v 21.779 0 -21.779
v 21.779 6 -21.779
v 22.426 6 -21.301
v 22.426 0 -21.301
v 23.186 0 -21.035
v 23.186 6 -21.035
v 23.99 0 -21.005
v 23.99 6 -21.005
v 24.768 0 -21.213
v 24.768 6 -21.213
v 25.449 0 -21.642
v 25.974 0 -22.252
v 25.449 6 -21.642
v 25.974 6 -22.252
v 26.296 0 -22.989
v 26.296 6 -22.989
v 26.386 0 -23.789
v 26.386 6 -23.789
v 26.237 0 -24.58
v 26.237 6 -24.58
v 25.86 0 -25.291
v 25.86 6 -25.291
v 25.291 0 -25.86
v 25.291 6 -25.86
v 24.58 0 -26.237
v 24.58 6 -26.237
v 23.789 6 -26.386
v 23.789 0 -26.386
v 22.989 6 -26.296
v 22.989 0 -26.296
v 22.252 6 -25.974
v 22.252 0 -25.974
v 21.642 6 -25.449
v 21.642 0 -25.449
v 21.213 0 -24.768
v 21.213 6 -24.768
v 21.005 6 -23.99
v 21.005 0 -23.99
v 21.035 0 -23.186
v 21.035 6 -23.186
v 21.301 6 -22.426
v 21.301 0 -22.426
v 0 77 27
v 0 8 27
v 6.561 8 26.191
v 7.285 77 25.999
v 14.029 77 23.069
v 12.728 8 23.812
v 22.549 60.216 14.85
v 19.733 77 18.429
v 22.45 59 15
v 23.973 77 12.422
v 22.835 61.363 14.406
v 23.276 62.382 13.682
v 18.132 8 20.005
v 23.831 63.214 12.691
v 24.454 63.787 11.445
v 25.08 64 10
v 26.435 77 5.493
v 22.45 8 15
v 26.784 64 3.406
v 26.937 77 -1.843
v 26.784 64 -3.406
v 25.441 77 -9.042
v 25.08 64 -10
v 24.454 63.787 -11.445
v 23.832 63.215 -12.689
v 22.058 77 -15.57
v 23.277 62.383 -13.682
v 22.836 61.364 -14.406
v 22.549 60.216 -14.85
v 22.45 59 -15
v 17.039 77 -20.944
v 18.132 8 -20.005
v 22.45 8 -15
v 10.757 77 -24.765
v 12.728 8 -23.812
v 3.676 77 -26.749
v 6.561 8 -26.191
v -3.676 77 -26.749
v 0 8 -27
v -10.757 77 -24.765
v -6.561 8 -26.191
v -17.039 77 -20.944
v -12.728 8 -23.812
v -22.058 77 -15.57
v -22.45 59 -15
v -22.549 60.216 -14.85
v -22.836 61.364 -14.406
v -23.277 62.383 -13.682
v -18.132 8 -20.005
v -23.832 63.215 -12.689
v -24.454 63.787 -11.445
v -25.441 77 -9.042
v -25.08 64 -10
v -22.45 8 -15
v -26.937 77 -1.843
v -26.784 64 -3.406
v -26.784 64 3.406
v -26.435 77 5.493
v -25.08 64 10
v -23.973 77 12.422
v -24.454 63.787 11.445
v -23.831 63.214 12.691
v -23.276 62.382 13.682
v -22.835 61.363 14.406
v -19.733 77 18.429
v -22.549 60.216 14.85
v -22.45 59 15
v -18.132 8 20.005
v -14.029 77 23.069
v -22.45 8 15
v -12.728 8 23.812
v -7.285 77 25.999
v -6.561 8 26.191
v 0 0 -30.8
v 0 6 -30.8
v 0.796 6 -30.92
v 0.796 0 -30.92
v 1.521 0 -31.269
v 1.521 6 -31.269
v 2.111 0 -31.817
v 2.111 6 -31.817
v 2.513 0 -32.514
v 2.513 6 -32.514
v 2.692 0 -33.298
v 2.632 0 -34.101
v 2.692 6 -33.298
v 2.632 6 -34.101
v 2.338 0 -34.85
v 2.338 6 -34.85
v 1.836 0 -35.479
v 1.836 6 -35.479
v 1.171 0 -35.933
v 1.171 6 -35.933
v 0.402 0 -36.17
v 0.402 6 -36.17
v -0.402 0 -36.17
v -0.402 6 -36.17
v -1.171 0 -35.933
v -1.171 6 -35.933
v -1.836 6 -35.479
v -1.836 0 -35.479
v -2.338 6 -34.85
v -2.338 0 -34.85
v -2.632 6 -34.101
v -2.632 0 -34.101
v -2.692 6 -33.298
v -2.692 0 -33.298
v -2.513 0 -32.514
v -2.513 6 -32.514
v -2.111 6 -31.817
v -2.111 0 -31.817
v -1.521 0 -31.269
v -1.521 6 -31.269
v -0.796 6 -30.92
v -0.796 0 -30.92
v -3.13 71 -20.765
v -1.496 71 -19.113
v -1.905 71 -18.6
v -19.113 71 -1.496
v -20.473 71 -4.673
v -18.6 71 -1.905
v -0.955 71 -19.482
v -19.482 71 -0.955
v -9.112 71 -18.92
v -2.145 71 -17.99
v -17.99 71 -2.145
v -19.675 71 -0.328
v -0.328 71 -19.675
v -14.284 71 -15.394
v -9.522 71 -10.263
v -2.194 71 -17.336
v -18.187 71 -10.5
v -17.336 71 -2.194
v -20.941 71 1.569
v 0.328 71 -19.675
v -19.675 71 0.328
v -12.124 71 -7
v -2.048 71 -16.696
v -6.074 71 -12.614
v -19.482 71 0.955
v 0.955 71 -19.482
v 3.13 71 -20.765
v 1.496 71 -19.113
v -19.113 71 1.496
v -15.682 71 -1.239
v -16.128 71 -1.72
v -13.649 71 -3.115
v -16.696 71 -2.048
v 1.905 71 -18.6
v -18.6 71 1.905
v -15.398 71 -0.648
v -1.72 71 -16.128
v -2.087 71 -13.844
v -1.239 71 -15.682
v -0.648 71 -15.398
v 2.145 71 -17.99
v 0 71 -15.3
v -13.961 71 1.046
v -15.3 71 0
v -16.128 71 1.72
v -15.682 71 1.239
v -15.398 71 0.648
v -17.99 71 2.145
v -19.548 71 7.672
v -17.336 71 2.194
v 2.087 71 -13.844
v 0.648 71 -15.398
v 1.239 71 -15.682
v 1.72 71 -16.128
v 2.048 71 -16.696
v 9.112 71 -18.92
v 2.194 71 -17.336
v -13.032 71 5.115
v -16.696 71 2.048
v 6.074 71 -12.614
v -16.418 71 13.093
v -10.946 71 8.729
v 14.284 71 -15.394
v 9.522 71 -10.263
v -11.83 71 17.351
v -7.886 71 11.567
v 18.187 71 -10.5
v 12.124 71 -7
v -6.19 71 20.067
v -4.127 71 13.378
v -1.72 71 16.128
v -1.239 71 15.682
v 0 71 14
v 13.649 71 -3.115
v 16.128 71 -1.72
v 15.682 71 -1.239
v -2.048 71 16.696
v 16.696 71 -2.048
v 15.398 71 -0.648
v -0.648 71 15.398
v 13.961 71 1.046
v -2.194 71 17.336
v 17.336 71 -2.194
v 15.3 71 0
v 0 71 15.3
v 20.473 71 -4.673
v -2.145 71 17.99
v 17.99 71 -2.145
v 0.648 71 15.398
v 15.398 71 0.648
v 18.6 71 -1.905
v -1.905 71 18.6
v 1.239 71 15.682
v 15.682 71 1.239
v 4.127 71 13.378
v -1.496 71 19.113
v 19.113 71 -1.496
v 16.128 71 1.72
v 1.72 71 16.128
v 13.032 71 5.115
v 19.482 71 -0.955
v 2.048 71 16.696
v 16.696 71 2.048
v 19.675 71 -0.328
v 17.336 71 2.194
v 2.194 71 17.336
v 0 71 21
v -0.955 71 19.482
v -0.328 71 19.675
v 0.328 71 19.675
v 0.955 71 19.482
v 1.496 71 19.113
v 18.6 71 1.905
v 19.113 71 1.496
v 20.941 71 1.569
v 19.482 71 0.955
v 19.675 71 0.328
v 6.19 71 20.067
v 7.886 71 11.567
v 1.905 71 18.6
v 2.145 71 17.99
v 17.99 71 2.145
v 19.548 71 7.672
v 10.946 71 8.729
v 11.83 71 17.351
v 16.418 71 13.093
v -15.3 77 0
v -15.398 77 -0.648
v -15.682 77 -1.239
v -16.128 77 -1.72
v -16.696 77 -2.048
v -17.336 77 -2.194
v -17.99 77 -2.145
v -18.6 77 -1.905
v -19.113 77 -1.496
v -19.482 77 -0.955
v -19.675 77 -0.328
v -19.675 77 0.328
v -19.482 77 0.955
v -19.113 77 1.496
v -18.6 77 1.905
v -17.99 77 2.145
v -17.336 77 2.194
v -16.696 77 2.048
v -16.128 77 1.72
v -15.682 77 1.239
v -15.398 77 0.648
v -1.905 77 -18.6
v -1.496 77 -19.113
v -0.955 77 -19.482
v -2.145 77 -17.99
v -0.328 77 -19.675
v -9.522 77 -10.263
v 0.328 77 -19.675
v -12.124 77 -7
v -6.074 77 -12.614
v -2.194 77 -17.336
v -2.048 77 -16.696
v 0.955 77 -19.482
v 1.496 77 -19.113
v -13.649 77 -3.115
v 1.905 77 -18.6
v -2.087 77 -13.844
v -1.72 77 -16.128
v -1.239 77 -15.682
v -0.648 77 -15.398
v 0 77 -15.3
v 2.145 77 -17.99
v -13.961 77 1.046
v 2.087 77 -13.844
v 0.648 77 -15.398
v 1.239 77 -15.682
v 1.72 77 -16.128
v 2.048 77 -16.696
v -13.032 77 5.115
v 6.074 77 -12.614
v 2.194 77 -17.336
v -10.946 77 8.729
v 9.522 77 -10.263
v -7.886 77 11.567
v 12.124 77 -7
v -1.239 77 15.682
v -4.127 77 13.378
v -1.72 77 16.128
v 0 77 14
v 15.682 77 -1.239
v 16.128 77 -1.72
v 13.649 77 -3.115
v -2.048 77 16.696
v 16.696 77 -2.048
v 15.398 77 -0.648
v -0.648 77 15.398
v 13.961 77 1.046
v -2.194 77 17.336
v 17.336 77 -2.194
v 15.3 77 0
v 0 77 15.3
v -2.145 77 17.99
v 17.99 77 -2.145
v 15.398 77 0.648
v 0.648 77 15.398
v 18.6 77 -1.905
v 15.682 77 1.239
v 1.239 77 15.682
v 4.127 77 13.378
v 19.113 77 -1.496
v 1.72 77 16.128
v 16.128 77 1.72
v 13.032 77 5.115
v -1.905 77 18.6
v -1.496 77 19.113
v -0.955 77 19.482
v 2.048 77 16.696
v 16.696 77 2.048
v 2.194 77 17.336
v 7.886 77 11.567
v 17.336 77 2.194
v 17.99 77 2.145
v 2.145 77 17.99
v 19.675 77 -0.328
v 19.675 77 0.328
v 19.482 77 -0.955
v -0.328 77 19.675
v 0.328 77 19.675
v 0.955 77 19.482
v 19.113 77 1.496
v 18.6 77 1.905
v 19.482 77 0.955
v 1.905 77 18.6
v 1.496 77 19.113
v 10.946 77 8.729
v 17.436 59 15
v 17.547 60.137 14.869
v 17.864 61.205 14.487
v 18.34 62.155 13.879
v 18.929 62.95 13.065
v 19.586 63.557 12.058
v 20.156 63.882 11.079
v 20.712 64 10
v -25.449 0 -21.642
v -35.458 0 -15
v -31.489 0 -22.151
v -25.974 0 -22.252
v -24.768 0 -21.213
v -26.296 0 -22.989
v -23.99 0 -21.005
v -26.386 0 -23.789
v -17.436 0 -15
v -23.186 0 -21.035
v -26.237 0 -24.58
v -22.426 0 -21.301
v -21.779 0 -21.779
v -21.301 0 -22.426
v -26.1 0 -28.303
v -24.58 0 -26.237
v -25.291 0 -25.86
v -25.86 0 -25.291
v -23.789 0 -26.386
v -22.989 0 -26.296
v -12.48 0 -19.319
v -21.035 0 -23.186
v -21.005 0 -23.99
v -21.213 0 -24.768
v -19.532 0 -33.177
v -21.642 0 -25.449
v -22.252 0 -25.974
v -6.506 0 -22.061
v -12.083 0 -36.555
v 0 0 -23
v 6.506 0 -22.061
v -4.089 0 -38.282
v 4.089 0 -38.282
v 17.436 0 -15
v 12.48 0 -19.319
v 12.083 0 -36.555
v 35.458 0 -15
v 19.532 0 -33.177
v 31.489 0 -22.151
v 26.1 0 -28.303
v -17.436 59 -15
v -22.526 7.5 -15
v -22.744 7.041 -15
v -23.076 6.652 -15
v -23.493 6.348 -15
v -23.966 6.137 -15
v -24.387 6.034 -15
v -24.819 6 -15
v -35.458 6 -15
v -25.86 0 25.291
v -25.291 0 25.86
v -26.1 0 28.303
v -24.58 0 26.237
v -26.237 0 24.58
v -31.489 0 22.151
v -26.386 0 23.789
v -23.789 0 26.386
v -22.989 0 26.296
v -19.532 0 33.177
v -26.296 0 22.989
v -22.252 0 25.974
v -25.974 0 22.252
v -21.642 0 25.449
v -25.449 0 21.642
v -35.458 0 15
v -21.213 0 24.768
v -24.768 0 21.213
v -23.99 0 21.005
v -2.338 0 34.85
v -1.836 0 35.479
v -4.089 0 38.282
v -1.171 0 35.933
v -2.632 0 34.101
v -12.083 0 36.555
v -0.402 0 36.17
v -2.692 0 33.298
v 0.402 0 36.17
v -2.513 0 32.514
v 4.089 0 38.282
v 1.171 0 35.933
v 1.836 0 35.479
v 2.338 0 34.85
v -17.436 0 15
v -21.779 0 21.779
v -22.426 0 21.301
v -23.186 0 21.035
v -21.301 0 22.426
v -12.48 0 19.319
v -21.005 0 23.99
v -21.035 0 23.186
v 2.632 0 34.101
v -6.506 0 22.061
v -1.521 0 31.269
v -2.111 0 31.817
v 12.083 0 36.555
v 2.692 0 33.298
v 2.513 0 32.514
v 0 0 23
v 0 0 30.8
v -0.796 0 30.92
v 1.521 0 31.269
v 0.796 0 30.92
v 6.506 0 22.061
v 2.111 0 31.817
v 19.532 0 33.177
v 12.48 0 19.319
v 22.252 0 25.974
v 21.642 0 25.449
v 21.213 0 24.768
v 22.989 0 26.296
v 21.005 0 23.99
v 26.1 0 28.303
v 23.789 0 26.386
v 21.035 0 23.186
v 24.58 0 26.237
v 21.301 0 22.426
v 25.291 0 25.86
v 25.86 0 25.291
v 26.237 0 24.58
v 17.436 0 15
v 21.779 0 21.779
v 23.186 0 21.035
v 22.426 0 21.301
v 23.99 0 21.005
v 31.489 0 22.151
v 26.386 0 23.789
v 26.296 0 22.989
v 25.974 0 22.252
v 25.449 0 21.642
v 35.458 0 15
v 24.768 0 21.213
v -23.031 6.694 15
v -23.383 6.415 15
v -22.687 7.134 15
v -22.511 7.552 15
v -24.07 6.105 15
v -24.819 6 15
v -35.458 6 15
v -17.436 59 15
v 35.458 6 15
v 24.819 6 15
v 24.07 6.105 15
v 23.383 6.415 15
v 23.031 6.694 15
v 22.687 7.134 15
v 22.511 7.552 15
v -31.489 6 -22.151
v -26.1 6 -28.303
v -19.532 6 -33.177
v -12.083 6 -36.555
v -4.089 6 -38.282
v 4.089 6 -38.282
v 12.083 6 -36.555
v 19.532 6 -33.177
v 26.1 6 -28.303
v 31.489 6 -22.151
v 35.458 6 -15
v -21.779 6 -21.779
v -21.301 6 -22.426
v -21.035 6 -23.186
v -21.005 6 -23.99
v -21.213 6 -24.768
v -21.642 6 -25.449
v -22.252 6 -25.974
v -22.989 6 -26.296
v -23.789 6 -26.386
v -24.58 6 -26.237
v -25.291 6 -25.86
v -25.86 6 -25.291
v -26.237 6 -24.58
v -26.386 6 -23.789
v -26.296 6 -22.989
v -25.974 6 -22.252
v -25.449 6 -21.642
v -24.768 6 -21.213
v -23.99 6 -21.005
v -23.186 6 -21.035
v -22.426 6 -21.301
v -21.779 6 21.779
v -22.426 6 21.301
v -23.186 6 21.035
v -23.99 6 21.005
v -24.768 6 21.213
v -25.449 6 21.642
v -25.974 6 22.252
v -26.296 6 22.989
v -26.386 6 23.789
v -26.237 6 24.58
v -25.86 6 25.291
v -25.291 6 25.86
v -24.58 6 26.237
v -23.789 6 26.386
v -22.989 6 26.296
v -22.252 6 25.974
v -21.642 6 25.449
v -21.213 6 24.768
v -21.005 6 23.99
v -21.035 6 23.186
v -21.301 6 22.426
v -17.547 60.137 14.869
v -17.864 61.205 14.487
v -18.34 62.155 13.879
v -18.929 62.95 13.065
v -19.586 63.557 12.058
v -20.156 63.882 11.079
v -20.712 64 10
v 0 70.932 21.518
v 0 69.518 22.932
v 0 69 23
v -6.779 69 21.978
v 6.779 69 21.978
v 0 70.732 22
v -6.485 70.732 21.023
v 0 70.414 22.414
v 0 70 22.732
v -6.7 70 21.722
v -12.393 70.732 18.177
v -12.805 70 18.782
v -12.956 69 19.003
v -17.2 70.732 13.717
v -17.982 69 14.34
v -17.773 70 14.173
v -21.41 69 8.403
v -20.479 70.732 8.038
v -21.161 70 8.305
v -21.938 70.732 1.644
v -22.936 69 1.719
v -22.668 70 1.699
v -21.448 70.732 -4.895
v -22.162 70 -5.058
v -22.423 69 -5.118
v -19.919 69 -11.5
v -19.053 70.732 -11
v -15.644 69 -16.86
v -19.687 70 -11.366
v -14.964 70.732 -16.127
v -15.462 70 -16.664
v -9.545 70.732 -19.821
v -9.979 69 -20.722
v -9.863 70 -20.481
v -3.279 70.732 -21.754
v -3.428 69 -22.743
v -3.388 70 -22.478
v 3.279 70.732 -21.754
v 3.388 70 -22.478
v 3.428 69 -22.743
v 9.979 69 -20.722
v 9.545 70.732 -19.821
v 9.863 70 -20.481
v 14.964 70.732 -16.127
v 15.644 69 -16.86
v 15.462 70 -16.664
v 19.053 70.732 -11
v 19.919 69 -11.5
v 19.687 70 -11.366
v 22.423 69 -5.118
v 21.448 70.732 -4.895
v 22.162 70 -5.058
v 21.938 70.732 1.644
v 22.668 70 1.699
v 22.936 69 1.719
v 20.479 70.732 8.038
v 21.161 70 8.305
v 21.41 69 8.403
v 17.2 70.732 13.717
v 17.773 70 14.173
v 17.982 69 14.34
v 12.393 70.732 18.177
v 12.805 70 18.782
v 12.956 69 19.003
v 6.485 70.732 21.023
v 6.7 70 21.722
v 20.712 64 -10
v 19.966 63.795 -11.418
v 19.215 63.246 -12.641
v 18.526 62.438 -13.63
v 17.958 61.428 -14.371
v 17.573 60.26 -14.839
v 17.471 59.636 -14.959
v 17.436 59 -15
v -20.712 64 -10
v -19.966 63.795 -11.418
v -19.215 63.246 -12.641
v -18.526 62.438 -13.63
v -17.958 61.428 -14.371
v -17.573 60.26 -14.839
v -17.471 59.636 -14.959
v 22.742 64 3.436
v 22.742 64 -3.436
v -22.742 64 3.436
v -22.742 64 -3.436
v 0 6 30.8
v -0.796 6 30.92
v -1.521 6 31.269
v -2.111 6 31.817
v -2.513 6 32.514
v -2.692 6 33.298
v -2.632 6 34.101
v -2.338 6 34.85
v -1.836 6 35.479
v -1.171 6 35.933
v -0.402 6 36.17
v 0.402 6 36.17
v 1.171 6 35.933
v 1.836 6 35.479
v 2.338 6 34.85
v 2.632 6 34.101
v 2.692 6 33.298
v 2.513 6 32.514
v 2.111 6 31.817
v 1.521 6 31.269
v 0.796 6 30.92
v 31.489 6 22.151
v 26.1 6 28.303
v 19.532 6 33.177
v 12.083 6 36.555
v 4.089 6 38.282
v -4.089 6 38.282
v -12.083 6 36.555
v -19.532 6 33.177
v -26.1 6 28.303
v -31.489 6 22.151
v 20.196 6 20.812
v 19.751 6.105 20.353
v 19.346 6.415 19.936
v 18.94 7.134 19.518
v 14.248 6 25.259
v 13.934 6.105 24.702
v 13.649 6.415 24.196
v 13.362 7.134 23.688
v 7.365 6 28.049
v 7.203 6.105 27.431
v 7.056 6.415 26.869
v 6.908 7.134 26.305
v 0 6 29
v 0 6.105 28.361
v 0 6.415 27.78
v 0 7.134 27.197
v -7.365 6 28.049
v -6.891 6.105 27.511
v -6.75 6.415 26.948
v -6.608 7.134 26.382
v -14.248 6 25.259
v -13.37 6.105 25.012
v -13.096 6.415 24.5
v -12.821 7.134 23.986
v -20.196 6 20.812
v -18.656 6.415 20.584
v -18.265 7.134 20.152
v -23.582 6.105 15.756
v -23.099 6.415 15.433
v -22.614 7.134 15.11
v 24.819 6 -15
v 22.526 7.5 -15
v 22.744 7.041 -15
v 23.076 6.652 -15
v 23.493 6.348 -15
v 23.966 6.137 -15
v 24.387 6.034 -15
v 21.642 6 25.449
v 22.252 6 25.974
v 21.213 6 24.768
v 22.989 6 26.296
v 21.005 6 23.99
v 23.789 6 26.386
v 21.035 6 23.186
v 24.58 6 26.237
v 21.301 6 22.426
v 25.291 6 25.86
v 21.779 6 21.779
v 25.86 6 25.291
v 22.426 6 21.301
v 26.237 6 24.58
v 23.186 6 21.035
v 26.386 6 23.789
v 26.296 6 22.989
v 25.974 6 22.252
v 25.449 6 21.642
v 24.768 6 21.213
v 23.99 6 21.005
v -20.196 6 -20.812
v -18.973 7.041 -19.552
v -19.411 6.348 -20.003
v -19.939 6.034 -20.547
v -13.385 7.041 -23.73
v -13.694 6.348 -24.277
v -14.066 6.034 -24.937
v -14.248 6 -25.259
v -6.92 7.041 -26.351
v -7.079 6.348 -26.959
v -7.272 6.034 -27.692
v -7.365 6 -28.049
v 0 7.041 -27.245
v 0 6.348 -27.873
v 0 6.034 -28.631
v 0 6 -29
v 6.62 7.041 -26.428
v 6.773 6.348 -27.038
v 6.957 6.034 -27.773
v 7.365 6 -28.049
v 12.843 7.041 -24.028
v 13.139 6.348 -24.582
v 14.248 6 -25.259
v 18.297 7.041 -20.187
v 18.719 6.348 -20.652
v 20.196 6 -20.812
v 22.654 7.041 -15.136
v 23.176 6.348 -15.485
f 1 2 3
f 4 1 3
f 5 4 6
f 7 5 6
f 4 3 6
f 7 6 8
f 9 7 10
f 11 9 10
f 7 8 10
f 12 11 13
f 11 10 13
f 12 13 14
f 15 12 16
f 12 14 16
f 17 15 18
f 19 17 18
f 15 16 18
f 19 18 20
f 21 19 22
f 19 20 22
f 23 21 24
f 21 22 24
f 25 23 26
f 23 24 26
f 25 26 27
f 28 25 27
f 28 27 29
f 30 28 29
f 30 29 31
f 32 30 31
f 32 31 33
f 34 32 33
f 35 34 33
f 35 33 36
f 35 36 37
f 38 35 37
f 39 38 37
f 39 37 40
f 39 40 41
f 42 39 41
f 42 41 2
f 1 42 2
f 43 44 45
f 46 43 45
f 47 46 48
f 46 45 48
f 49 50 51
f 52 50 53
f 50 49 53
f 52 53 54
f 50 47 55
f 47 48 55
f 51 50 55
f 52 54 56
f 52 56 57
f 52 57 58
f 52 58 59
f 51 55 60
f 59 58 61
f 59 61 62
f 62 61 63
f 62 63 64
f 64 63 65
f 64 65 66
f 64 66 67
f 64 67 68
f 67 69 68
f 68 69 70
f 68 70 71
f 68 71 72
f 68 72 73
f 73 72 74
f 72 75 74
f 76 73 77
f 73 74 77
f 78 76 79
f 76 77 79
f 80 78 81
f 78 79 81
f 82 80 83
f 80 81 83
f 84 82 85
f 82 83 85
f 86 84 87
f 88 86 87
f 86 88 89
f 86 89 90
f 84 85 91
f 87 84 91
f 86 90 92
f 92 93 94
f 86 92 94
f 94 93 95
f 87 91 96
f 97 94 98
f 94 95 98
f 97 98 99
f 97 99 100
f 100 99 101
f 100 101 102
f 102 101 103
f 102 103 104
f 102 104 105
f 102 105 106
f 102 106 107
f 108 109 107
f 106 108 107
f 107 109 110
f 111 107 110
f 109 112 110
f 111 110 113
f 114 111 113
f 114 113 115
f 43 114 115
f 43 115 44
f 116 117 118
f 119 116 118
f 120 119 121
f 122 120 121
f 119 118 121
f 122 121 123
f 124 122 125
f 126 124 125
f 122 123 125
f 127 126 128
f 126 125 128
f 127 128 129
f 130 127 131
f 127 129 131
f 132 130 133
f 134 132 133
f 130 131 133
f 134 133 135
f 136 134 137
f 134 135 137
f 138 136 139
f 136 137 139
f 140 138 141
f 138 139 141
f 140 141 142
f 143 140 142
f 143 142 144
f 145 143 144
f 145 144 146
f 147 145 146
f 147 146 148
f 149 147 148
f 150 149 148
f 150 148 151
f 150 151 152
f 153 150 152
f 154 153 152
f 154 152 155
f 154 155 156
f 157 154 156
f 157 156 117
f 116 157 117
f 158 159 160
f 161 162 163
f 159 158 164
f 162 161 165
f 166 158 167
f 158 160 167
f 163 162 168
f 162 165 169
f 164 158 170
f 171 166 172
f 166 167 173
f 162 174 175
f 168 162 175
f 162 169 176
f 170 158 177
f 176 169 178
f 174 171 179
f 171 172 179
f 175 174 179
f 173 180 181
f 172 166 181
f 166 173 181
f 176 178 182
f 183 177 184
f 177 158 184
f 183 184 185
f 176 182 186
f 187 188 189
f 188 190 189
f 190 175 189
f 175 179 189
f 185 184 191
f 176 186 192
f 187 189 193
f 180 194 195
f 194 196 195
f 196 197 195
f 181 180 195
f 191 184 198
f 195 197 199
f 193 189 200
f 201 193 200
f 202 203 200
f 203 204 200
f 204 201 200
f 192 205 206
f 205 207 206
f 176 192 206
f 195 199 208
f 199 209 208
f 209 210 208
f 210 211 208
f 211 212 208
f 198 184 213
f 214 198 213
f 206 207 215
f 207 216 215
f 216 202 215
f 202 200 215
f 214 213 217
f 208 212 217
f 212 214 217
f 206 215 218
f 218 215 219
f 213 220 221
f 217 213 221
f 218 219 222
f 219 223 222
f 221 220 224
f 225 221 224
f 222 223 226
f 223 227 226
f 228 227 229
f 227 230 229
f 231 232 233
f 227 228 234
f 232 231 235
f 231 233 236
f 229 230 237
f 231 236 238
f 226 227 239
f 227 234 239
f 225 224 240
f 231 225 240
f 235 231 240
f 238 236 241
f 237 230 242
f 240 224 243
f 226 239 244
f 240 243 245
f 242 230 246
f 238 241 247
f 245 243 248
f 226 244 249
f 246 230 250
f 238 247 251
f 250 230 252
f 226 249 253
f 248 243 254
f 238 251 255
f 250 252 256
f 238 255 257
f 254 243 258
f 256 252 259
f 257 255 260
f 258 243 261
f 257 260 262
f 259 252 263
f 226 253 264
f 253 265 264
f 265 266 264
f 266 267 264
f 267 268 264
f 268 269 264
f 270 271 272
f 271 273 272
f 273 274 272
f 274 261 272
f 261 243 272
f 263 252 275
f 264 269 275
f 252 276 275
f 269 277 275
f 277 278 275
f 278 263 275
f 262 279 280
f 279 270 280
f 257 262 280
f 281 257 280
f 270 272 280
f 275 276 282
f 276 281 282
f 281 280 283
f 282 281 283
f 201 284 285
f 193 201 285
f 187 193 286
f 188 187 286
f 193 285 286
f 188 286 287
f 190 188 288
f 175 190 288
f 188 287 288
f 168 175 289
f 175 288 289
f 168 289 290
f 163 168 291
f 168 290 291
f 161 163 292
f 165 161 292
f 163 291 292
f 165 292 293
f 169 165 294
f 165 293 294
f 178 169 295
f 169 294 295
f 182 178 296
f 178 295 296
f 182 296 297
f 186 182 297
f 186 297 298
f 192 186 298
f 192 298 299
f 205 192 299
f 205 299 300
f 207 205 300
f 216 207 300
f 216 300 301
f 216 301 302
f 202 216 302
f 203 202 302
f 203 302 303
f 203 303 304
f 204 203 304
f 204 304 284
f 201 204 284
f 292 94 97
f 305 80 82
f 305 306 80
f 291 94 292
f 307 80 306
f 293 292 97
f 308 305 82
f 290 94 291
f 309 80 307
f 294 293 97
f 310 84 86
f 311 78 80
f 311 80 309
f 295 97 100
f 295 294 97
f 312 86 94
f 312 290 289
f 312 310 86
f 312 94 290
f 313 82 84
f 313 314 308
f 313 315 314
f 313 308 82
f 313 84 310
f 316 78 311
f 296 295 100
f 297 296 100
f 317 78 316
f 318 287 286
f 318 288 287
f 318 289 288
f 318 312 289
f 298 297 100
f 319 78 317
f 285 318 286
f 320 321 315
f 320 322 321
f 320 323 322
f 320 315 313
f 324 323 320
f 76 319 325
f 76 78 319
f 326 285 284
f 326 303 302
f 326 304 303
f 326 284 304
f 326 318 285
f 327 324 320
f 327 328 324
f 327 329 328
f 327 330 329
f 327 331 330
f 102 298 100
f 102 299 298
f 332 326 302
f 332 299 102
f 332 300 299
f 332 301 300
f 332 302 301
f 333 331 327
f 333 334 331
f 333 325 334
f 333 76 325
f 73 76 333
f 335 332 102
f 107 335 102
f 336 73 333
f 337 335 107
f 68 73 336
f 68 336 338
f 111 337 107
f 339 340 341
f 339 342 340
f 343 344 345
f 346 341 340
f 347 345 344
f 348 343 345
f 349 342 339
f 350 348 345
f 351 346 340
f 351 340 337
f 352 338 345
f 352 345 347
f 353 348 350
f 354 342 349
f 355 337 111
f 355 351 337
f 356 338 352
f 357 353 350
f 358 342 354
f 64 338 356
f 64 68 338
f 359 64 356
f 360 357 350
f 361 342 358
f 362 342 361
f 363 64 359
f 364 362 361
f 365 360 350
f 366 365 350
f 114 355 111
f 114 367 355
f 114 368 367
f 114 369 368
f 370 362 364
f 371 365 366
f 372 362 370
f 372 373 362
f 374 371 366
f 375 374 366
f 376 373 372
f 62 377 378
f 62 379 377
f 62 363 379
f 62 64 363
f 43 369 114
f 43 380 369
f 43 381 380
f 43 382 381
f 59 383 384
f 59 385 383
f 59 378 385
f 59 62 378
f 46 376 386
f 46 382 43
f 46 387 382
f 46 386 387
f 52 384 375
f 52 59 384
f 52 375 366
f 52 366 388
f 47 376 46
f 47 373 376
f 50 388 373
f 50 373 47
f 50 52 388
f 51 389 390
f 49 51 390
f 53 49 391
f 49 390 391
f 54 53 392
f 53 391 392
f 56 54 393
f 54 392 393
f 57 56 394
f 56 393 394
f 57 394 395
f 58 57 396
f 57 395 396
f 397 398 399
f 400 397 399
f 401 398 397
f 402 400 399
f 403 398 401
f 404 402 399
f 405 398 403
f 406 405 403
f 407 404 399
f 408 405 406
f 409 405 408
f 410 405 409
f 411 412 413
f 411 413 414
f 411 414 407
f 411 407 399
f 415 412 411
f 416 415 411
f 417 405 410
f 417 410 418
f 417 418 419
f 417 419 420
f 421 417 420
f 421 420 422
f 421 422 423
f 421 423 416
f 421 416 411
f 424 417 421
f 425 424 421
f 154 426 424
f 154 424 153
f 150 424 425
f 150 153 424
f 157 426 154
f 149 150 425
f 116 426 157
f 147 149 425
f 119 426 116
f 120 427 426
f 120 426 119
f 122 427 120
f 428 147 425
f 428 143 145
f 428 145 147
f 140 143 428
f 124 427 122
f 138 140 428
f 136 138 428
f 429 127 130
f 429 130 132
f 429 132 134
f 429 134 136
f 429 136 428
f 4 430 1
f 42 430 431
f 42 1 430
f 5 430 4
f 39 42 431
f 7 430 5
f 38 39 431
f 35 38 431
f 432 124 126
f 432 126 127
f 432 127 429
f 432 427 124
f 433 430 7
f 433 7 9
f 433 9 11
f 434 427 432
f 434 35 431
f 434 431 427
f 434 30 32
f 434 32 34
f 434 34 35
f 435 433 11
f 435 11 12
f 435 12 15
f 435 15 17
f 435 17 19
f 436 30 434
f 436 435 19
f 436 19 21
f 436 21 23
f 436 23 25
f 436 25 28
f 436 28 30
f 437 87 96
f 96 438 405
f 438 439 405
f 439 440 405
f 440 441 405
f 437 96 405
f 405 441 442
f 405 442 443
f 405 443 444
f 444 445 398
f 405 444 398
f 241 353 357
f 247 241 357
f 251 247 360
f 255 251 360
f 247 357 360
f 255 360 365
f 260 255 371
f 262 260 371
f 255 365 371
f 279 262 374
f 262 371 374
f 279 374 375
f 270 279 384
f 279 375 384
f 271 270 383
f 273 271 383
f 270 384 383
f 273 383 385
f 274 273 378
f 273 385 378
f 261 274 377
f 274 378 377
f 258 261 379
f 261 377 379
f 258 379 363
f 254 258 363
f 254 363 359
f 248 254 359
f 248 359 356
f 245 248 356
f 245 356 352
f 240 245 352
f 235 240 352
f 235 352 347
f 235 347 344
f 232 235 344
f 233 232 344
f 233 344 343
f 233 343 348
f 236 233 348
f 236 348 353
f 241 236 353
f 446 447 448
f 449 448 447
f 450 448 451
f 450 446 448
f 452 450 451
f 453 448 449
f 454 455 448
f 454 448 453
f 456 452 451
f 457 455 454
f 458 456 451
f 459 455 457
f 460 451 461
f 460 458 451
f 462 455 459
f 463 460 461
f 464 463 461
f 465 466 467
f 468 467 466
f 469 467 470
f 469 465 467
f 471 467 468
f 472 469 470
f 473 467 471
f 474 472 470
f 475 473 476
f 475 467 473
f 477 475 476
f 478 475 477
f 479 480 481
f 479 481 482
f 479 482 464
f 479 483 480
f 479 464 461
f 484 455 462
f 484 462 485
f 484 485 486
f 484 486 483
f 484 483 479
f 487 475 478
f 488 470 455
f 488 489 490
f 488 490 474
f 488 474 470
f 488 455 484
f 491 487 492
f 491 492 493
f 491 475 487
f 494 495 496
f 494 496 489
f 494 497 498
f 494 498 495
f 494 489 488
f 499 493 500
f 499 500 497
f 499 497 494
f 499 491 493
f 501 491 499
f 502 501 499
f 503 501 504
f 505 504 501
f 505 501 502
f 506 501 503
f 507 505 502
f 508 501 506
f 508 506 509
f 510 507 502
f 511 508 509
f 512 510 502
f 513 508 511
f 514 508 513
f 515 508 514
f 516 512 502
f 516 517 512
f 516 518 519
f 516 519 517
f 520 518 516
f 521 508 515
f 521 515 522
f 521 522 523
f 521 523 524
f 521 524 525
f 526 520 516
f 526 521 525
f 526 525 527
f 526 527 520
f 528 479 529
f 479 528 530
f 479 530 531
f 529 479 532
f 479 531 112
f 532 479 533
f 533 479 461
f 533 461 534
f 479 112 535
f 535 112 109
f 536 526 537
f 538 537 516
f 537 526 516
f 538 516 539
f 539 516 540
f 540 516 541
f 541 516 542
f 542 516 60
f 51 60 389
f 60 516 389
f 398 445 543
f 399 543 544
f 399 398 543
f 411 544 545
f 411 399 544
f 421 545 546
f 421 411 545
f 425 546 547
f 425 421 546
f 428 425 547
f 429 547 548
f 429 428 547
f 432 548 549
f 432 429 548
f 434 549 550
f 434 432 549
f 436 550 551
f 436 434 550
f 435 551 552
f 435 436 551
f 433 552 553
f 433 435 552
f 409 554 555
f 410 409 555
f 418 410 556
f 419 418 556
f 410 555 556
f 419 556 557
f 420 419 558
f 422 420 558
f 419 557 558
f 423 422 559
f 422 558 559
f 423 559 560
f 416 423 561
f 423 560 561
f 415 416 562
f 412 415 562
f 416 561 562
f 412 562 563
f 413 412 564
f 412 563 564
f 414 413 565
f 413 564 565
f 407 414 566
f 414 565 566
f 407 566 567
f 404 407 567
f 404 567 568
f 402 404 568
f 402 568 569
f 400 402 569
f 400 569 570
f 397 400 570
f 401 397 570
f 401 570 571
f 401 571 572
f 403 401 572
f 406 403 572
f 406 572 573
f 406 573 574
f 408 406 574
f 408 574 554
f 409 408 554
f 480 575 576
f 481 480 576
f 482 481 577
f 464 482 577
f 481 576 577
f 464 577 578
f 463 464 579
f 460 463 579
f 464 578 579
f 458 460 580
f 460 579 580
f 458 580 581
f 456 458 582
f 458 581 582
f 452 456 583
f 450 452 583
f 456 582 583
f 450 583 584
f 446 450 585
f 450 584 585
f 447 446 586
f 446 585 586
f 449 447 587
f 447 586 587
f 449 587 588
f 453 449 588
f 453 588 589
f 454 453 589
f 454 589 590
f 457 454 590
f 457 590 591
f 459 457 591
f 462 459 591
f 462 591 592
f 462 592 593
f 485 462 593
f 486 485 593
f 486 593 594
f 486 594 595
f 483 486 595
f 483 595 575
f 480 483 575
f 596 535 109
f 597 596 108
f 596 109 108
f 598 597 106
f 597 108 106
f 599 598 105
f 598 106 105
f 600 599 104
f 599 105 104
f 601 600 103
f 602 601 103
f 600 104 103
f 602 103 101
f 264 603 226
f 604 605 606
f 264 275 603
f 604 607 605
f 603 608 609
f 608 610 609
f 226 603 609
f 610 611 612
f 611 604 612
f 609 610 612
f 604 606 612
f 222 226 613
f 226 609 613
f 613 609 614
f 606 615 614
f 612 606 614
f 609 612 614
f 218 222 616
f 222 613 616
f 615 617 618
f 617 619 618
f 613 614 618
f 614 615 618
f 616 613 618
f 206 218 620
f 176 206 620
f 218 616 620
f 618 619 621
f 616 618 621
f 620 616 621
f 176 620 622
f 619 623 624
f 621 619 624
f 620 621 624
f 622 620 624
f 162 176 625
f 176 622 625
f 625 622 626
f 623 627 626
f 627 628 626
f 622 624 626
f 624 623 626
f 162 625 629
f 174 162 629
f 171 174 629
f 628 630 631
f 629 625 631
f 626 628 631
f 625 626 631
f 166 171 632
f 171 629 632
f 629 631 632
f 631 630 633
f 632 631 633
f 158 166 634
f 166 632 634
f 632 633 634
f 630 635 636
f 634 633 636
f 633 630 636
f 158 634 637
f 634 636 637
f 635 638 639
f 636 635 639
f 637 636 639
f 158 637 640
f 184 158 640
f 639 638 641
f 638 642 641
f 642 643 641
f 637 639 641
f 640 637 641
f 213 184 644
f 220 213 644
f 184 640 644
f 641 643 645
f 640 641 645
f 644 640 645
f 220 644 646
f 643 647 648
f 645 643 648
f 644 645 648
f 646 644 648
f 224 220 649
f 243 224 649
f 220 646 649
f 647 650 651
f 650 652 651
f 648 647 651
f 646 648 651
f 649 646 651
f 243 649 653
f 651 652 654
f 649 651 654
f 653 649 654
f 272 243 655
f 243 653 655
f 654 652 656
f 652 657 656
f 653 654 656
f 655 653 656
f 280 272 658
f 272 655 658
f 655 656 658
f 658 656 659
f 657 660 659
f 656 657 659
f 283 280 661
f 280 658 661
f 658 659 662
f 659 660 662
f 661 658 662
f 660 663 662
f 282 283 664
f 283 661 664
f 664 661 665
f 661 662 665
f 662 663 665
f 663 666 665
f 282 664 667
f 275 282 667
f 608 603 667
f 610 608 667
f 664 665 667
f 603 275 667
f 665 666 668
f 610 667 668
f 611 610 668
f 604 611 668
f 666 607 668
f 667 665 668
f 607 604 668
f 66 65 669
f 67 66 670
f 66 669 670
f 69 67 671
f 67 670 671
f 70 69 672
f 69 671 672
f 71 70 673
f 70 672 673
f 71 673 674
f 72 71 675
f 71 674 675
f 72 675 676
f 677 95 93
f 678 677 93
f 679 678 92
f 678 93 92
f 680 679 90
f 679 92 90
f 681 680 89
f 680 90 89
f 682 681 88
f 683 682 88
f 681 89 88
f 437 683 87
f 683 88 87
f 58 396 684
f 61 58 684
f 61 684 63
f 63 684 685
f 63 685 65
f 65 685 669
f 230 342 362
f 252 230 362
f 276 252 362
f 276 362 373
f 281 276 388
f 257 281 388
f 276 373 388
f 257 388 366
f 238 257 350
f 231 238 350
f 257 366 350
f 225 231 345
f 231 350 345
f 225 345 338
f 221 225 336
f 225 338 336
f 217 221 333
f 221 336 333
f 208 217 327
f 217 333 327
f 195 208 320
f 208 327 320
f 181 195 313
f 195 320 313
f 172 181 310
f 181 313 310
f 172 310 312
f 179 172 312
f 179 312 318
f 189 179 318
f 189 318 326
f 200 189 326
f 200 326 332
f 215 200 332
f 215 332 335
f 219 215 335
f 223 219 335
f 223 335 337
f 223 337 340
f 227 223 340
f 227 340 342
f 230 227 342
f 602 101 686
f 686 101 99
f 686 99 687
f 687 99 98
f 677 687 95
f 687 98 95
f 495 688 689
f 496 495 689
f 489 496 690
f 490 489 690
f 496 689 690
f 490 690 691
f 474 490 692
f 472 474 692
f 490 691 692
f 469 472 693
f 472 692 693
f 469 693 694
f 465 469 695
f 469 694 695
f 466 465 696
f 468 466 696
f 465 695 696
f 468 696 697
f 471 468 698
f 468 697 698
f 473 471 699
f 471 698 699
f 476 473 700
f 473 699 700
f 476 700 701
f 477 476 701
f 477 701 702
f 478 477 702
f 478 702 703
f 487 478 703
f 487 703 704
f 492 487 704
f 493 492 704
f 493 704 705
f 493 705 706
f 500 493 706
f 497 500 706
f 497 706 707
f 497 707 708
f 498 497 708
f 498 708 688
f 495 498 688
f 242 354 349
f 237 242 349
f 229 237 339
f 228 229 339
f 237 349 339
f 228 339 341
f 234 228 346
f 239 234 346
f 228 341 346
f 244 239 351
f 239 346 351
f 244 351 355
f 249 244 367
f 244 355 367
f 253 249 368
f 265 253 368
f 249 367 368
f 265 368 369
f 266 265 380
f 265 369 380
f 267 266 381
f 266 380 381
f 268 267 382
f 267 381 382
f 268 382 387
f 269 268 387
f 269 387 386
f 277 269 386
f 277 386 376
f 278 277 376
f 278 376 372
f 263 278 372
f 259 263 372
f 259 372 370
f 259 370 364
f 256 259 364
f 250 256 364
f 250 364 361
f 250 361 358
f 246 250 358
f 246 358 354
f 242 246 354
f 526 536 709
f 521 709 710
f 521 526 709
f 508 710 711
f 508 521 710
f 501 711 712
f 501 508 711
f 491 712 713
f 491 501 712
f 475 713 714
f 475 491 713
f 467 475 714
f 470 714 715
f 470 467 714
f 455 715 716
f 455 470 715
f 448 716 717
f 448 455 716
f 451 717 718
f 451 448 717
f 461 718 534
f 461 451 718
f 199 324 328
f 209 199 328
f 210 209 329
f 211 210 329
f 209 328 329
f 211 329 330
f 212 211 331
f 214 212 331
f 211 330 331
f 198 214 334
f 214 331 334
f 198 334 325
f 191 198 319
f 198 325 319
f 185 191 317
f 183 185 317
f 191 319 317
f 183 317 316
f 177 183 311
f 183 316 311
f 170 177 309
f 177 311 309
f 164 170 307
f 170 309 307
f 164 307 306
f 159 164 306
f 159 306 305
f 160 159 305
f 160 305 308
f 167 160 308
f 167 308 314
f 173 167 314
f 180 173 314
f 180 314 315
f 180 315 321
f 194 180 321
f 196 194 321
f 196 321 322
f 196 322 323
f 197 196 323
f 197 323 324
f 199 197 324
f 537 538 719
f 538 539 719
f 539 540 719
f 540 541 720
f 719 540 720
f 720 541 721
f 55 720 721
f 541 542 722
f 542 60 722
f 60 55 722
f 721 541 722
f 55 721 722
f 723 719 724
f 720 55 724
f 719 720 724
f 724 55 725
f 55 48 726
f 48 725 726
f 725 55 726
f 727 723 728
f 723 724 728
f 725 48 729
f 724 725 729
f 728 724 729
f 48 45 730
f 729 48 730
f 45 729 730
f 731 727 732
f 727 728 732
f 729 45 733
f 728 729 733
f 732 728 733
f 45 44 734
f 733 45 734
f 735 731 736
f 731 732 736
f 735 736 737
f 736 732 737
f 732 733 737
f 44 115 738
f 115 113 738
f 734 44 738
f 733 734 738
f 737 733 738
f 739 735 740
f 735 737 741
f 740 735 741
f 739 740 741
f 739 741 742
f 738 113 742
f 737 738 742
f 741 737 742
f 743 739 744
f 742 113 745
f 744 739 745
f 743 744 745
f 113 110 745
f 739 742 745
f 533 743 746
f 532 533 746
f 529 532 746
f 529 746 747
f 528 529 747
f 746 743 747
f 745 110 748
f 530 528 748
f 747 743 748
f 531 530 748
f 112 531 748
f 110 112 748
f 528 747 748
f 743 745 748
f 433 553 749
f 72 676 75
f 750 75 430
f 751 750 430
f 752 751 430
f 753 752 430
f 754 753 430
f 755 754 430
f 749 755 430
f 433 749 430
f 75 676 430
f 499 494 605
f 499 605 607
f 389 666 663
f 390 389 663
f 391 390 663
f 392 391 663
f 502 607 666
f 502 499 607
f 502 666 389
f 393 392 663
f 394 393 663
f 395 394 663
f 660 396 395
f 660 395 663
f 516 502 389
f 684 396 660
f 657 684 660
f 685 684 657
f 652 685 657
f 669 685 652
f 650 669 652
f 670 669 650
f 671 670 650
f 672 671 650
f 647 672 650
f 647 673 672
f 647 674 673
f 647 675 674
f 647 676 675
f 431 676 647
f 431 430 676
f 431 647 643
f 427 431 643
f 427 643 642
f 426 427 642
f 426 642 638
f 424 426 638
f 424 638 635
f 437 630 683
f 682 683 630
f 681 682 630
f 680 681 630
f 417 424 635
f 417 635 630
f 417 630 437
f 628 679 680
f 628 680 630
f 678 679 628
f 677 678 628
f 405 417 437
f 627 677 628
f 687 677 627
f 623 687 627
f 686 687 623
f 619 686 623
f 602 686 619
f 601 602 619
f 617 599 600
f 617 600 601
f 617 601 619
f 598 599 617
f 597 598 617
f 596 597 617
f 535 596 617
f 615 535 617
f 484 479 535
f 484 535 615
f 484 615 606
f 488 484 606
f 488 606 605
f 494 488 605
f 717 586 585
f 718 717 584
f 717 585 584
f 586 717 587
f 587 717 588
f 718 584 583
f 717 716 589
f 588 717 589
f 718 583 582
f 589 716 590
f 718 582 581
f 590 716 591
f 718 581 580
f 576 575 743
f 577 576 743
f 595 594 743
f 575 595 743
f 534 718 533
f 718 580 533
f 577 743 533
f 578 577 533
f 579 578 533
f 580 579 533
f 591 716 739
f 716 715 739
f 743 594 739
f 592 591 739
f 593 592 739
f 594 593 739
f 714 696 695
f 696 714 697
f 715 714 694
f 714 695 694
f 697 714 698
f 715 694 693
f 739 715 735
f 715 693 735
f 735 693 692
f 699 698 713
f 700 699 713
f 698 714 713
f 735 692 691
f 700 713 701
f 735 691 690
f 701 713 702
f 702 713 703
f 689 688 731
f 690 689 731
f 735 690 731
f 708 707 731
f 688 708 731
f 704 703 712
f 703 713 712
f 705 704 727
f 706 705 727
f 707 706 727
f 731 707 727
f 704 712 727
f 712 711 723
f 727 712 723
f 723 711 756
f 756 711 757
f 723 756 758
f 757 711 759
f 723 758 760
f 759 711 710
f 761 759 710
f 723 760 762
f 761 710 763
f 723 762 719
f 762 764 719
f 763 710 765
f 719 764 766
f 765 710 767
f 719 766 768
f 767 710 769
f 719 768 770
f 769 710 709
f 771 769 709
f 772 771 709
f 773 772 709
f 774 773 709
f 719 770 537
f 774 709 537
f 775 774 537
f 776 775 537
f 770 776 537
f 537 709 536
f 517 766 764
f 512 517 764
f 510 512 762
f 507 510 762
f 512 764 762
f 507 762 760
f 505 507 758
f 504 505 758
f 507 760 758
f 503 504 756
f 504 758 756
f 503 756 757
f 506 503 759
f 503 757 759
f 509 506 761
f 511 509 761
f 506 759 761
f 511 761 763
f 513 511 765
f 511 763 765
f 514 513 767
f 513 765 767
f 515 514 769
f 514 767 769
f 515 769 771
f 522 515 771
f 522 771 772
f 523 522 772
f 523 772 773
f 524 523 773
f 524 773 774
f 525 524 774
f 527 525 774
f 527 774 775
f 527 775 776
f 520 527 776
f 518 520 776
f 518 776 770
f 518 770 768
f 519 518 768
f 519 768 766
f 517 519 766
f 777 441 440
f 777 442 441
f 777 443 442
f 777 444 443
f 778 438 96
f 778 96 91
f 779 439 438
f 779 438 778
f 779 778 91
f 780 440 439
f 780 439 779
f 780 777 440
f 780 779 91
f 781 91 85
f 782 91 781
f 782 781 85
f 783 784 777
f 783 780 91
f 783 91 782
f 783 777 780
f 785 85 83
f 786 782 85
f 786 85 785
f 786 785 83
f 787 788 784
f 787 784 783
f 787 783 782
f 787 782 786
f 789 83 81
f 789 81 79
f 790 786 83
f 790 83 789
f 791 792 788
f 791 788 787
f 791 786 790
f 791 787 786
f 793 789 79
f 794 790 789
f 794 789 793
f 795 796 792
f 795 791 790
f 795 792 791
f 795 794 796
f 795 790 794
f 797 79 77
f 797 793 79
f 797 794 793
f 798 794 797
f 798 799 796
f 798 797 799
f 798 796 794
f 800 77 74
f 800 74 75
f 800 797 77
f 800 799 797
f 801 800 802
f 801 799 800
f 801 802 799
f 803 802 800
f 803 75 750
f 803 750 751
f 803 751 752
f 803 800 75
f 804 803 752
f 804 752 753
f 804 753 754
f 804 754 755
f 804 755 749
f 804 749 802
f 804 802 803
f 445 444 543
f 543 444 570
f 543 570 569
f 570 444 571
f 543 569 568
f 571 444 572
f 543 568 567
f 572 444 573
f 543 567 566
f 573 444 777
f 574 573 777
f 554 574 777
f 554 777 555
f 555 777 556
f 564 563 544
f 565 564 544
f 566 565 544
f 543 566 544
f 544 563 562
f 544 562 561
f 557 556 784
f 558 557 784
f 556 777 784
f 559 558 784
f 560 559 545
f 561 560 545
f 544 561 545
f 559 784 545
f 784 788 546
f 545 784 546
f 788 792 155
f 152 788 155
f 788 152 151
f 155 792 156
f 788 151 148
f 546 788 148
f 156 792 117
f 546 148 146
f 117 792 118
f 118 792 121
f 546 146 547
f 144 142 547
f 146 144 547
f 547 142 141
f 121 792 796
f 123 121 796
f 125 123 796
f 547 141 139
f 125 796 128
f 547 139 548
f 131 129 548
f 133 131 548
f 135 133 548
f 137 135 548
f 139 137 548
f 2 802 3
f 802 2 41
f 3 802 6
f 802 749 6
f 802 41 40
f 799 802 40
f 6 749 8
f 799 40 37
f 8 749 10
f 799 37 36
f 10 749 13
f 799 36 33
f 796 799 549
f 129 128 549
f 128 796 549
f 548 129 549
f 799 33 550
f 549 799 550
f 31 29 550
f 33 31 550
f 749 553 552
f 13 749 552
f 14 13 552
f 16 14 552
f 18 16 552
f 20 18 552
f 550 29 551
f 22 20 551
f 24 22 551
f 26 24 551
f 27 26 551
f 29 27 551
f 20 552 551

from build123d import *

# Parameters (mm, degrees)
SKETCH1_R               = 27
SKETCH1_R_2             = 23
BOSS_EXTRUDE1_DEPTH     = 77
BOSS_EXTRUDE2_START     = -6
SKETCH2_R               = 27
BOSS_EXTRUDE2_DEPTH     = 6
SKETCH3_R               = 38.5
SKETCH3_R_2             = 23
BOSS_EXTRUDE3_DEPTH     = 6
SKETCH4_R               = 14
CUT_EXTRUDE1_DEPTH      = 95.305355097
CUT_EXTRUDE2_DEPTH      = 95.305355097
CUT_EXTRUDE2_DEPTH_BACK = 95.305355097
FILLET1_R               = 2
SKETCH7_R               = 2.7
CUT_EXTRUDE3_DEPTH      = 89.207142689
CIRPATTERN1_COUNT       = 8
SKETCH8_R               = 2.2
CUT_EXTRUDE4_DEPTH      = 94.104779805
CIRPATTERN2_COUNT       = 4


with BuildPart() as part:
    # Sketch1 → Boss-Extrude1 (new body)
    with BuildSketch(Plane(origin=(0, 0, 0), x_dir=(1, 0, 0), z_dir=(0, 1, 0))):
        Circle(SKETCH1_R)
        Circle(SKETCH1_R_2, mode=Mode.SUBTRACT)
    extrude(amount=BOSS_EXTRUDE1_DEPTH)

    # Sketch2 → Boss-Extrude2 (add)
    with BuildSketch(Plane(origin=(0, 77, 0), x_dir=(1, 0, 0), z_dir=(0, 1, 0)).offset(BOSS_EXTRUDE2_START)):
        Circle(SKETCH2_R)
    extrude(amount=BOSS_EXTRUDE2_DEPTH)

    # Sketch3 → Boss-Extrude3 (add)
    with BuildSketch(Plane.XZ):
        Circle(SKETCH3_R)
        Circle(SKETCH3_R_2, mode=Mode.SUBTRACT)
    extrude(amount=-BOSS_EXTRUDE3_DEPTH)

    # Sketch4 → Cut-Extrude1 (cut, through all)
    with BuildSketch(Plane(origin=(0, 77, 0), x_dir=(1, 0, 0), z_dir=(0, 1, 0))):
        Circle(SKETCH4_R)
    extrude(amount=-CUT_EXTRUDE1_DEPTH, mode=Mode.SUBTRACT)

    # Sketch5 → Cut-Extrude2 (cut, two sides: drawn at the far end of the back side and taken through both)
    with BuildSketch(Plane(origin=(0, 0, 0), x_dir=(0, 0, -1), z_dir=(1, 0, 0)).offset(-CUT_EXTRUDE2_DEPTH_BACK)):
        with BuildLine():
            Line((-15, 0), (-15, 59))
            ThreePointArc((-15, 59), (-13.535533906, 62.535533906), (-10, 64))
            Line((-10, 64), (10, 64))
            ThreePointArc((10, 64), (13.535533906, 62.535533906), (15, 59))
            Line((15, 59), (15, 0))
            Line((15, 0), (-15, 0))
        make_face()
    extrude(amount=CUT_EXTRUDE2_DEPTH + CUT_EXTRUDE2_DEPTH_BACK, mode=Mode.SUBTRACT)

    # Fillet1
    fillet1_edges = [part.edges().sort_by_distance(p)[0] for p in [
        (-23, 71, 0),
        (0, 6, -27),
        (0, 6, 27),
    ]]
    fillet(fillet1_edges, radius=FILLET1_R)

    # Sketch7 → Cut-Extrude3 (cut, through all)
    with BuildSketch(Plane(origin=(0, 6, 0), x_dir=(1, 0, 0), z_dir=(0, 1, 0))):
        with Locations((0, 33.5)):
            Circle(SKETCH7_R)
    cut_extrude3 = extrude(amount=-CUT_EXTRUDE3_DEPTH, mode=Mode.SUBTRACT)

    # CirPattern1: Cut-Extrude3 ×8 about axis, 2 skipped
    cirpattern1_axis = Axis((0, -3.85, 0), (0, 1, 0))
    add([cut_extrude3.rotate(cirpattern1_axis, i * 360 / CIRPATTERN1_COUNT) for i in range(1, CIRPATTERN1_COUNT) if i not in (2, 6)], mode=Mode.SUBTRACT)

    # Sketch8 → Cut-Extrude4 (cut, through all)
    with BuildSketch(Plane(origin=(0, 77, 0), x_dir=(1, 0, 0), z_dir=(0, 1, 0))):
        with Locations((0, 17.5)):
            Circle(SKETCH8_R)
    cut_extrude4 = extrude(amount=-CUT_EXTRUDE4_DEPTH, mode=Mode.SUBTRACT)

    # CirPattern2: Cut-Extrude4 ×4 about axis
    cirpattern2_axis = Axis((0, -3.85, 0), (0, 1, 0))
    for i in range(1, CIRPATTERN2_COUNT):
        add(cut_extrude4.rotate(cirpattern2_axis, i * 360 / CIRPATTERN2_COUNT), mode=Mode.SUBTRACT)


solid = part.part
